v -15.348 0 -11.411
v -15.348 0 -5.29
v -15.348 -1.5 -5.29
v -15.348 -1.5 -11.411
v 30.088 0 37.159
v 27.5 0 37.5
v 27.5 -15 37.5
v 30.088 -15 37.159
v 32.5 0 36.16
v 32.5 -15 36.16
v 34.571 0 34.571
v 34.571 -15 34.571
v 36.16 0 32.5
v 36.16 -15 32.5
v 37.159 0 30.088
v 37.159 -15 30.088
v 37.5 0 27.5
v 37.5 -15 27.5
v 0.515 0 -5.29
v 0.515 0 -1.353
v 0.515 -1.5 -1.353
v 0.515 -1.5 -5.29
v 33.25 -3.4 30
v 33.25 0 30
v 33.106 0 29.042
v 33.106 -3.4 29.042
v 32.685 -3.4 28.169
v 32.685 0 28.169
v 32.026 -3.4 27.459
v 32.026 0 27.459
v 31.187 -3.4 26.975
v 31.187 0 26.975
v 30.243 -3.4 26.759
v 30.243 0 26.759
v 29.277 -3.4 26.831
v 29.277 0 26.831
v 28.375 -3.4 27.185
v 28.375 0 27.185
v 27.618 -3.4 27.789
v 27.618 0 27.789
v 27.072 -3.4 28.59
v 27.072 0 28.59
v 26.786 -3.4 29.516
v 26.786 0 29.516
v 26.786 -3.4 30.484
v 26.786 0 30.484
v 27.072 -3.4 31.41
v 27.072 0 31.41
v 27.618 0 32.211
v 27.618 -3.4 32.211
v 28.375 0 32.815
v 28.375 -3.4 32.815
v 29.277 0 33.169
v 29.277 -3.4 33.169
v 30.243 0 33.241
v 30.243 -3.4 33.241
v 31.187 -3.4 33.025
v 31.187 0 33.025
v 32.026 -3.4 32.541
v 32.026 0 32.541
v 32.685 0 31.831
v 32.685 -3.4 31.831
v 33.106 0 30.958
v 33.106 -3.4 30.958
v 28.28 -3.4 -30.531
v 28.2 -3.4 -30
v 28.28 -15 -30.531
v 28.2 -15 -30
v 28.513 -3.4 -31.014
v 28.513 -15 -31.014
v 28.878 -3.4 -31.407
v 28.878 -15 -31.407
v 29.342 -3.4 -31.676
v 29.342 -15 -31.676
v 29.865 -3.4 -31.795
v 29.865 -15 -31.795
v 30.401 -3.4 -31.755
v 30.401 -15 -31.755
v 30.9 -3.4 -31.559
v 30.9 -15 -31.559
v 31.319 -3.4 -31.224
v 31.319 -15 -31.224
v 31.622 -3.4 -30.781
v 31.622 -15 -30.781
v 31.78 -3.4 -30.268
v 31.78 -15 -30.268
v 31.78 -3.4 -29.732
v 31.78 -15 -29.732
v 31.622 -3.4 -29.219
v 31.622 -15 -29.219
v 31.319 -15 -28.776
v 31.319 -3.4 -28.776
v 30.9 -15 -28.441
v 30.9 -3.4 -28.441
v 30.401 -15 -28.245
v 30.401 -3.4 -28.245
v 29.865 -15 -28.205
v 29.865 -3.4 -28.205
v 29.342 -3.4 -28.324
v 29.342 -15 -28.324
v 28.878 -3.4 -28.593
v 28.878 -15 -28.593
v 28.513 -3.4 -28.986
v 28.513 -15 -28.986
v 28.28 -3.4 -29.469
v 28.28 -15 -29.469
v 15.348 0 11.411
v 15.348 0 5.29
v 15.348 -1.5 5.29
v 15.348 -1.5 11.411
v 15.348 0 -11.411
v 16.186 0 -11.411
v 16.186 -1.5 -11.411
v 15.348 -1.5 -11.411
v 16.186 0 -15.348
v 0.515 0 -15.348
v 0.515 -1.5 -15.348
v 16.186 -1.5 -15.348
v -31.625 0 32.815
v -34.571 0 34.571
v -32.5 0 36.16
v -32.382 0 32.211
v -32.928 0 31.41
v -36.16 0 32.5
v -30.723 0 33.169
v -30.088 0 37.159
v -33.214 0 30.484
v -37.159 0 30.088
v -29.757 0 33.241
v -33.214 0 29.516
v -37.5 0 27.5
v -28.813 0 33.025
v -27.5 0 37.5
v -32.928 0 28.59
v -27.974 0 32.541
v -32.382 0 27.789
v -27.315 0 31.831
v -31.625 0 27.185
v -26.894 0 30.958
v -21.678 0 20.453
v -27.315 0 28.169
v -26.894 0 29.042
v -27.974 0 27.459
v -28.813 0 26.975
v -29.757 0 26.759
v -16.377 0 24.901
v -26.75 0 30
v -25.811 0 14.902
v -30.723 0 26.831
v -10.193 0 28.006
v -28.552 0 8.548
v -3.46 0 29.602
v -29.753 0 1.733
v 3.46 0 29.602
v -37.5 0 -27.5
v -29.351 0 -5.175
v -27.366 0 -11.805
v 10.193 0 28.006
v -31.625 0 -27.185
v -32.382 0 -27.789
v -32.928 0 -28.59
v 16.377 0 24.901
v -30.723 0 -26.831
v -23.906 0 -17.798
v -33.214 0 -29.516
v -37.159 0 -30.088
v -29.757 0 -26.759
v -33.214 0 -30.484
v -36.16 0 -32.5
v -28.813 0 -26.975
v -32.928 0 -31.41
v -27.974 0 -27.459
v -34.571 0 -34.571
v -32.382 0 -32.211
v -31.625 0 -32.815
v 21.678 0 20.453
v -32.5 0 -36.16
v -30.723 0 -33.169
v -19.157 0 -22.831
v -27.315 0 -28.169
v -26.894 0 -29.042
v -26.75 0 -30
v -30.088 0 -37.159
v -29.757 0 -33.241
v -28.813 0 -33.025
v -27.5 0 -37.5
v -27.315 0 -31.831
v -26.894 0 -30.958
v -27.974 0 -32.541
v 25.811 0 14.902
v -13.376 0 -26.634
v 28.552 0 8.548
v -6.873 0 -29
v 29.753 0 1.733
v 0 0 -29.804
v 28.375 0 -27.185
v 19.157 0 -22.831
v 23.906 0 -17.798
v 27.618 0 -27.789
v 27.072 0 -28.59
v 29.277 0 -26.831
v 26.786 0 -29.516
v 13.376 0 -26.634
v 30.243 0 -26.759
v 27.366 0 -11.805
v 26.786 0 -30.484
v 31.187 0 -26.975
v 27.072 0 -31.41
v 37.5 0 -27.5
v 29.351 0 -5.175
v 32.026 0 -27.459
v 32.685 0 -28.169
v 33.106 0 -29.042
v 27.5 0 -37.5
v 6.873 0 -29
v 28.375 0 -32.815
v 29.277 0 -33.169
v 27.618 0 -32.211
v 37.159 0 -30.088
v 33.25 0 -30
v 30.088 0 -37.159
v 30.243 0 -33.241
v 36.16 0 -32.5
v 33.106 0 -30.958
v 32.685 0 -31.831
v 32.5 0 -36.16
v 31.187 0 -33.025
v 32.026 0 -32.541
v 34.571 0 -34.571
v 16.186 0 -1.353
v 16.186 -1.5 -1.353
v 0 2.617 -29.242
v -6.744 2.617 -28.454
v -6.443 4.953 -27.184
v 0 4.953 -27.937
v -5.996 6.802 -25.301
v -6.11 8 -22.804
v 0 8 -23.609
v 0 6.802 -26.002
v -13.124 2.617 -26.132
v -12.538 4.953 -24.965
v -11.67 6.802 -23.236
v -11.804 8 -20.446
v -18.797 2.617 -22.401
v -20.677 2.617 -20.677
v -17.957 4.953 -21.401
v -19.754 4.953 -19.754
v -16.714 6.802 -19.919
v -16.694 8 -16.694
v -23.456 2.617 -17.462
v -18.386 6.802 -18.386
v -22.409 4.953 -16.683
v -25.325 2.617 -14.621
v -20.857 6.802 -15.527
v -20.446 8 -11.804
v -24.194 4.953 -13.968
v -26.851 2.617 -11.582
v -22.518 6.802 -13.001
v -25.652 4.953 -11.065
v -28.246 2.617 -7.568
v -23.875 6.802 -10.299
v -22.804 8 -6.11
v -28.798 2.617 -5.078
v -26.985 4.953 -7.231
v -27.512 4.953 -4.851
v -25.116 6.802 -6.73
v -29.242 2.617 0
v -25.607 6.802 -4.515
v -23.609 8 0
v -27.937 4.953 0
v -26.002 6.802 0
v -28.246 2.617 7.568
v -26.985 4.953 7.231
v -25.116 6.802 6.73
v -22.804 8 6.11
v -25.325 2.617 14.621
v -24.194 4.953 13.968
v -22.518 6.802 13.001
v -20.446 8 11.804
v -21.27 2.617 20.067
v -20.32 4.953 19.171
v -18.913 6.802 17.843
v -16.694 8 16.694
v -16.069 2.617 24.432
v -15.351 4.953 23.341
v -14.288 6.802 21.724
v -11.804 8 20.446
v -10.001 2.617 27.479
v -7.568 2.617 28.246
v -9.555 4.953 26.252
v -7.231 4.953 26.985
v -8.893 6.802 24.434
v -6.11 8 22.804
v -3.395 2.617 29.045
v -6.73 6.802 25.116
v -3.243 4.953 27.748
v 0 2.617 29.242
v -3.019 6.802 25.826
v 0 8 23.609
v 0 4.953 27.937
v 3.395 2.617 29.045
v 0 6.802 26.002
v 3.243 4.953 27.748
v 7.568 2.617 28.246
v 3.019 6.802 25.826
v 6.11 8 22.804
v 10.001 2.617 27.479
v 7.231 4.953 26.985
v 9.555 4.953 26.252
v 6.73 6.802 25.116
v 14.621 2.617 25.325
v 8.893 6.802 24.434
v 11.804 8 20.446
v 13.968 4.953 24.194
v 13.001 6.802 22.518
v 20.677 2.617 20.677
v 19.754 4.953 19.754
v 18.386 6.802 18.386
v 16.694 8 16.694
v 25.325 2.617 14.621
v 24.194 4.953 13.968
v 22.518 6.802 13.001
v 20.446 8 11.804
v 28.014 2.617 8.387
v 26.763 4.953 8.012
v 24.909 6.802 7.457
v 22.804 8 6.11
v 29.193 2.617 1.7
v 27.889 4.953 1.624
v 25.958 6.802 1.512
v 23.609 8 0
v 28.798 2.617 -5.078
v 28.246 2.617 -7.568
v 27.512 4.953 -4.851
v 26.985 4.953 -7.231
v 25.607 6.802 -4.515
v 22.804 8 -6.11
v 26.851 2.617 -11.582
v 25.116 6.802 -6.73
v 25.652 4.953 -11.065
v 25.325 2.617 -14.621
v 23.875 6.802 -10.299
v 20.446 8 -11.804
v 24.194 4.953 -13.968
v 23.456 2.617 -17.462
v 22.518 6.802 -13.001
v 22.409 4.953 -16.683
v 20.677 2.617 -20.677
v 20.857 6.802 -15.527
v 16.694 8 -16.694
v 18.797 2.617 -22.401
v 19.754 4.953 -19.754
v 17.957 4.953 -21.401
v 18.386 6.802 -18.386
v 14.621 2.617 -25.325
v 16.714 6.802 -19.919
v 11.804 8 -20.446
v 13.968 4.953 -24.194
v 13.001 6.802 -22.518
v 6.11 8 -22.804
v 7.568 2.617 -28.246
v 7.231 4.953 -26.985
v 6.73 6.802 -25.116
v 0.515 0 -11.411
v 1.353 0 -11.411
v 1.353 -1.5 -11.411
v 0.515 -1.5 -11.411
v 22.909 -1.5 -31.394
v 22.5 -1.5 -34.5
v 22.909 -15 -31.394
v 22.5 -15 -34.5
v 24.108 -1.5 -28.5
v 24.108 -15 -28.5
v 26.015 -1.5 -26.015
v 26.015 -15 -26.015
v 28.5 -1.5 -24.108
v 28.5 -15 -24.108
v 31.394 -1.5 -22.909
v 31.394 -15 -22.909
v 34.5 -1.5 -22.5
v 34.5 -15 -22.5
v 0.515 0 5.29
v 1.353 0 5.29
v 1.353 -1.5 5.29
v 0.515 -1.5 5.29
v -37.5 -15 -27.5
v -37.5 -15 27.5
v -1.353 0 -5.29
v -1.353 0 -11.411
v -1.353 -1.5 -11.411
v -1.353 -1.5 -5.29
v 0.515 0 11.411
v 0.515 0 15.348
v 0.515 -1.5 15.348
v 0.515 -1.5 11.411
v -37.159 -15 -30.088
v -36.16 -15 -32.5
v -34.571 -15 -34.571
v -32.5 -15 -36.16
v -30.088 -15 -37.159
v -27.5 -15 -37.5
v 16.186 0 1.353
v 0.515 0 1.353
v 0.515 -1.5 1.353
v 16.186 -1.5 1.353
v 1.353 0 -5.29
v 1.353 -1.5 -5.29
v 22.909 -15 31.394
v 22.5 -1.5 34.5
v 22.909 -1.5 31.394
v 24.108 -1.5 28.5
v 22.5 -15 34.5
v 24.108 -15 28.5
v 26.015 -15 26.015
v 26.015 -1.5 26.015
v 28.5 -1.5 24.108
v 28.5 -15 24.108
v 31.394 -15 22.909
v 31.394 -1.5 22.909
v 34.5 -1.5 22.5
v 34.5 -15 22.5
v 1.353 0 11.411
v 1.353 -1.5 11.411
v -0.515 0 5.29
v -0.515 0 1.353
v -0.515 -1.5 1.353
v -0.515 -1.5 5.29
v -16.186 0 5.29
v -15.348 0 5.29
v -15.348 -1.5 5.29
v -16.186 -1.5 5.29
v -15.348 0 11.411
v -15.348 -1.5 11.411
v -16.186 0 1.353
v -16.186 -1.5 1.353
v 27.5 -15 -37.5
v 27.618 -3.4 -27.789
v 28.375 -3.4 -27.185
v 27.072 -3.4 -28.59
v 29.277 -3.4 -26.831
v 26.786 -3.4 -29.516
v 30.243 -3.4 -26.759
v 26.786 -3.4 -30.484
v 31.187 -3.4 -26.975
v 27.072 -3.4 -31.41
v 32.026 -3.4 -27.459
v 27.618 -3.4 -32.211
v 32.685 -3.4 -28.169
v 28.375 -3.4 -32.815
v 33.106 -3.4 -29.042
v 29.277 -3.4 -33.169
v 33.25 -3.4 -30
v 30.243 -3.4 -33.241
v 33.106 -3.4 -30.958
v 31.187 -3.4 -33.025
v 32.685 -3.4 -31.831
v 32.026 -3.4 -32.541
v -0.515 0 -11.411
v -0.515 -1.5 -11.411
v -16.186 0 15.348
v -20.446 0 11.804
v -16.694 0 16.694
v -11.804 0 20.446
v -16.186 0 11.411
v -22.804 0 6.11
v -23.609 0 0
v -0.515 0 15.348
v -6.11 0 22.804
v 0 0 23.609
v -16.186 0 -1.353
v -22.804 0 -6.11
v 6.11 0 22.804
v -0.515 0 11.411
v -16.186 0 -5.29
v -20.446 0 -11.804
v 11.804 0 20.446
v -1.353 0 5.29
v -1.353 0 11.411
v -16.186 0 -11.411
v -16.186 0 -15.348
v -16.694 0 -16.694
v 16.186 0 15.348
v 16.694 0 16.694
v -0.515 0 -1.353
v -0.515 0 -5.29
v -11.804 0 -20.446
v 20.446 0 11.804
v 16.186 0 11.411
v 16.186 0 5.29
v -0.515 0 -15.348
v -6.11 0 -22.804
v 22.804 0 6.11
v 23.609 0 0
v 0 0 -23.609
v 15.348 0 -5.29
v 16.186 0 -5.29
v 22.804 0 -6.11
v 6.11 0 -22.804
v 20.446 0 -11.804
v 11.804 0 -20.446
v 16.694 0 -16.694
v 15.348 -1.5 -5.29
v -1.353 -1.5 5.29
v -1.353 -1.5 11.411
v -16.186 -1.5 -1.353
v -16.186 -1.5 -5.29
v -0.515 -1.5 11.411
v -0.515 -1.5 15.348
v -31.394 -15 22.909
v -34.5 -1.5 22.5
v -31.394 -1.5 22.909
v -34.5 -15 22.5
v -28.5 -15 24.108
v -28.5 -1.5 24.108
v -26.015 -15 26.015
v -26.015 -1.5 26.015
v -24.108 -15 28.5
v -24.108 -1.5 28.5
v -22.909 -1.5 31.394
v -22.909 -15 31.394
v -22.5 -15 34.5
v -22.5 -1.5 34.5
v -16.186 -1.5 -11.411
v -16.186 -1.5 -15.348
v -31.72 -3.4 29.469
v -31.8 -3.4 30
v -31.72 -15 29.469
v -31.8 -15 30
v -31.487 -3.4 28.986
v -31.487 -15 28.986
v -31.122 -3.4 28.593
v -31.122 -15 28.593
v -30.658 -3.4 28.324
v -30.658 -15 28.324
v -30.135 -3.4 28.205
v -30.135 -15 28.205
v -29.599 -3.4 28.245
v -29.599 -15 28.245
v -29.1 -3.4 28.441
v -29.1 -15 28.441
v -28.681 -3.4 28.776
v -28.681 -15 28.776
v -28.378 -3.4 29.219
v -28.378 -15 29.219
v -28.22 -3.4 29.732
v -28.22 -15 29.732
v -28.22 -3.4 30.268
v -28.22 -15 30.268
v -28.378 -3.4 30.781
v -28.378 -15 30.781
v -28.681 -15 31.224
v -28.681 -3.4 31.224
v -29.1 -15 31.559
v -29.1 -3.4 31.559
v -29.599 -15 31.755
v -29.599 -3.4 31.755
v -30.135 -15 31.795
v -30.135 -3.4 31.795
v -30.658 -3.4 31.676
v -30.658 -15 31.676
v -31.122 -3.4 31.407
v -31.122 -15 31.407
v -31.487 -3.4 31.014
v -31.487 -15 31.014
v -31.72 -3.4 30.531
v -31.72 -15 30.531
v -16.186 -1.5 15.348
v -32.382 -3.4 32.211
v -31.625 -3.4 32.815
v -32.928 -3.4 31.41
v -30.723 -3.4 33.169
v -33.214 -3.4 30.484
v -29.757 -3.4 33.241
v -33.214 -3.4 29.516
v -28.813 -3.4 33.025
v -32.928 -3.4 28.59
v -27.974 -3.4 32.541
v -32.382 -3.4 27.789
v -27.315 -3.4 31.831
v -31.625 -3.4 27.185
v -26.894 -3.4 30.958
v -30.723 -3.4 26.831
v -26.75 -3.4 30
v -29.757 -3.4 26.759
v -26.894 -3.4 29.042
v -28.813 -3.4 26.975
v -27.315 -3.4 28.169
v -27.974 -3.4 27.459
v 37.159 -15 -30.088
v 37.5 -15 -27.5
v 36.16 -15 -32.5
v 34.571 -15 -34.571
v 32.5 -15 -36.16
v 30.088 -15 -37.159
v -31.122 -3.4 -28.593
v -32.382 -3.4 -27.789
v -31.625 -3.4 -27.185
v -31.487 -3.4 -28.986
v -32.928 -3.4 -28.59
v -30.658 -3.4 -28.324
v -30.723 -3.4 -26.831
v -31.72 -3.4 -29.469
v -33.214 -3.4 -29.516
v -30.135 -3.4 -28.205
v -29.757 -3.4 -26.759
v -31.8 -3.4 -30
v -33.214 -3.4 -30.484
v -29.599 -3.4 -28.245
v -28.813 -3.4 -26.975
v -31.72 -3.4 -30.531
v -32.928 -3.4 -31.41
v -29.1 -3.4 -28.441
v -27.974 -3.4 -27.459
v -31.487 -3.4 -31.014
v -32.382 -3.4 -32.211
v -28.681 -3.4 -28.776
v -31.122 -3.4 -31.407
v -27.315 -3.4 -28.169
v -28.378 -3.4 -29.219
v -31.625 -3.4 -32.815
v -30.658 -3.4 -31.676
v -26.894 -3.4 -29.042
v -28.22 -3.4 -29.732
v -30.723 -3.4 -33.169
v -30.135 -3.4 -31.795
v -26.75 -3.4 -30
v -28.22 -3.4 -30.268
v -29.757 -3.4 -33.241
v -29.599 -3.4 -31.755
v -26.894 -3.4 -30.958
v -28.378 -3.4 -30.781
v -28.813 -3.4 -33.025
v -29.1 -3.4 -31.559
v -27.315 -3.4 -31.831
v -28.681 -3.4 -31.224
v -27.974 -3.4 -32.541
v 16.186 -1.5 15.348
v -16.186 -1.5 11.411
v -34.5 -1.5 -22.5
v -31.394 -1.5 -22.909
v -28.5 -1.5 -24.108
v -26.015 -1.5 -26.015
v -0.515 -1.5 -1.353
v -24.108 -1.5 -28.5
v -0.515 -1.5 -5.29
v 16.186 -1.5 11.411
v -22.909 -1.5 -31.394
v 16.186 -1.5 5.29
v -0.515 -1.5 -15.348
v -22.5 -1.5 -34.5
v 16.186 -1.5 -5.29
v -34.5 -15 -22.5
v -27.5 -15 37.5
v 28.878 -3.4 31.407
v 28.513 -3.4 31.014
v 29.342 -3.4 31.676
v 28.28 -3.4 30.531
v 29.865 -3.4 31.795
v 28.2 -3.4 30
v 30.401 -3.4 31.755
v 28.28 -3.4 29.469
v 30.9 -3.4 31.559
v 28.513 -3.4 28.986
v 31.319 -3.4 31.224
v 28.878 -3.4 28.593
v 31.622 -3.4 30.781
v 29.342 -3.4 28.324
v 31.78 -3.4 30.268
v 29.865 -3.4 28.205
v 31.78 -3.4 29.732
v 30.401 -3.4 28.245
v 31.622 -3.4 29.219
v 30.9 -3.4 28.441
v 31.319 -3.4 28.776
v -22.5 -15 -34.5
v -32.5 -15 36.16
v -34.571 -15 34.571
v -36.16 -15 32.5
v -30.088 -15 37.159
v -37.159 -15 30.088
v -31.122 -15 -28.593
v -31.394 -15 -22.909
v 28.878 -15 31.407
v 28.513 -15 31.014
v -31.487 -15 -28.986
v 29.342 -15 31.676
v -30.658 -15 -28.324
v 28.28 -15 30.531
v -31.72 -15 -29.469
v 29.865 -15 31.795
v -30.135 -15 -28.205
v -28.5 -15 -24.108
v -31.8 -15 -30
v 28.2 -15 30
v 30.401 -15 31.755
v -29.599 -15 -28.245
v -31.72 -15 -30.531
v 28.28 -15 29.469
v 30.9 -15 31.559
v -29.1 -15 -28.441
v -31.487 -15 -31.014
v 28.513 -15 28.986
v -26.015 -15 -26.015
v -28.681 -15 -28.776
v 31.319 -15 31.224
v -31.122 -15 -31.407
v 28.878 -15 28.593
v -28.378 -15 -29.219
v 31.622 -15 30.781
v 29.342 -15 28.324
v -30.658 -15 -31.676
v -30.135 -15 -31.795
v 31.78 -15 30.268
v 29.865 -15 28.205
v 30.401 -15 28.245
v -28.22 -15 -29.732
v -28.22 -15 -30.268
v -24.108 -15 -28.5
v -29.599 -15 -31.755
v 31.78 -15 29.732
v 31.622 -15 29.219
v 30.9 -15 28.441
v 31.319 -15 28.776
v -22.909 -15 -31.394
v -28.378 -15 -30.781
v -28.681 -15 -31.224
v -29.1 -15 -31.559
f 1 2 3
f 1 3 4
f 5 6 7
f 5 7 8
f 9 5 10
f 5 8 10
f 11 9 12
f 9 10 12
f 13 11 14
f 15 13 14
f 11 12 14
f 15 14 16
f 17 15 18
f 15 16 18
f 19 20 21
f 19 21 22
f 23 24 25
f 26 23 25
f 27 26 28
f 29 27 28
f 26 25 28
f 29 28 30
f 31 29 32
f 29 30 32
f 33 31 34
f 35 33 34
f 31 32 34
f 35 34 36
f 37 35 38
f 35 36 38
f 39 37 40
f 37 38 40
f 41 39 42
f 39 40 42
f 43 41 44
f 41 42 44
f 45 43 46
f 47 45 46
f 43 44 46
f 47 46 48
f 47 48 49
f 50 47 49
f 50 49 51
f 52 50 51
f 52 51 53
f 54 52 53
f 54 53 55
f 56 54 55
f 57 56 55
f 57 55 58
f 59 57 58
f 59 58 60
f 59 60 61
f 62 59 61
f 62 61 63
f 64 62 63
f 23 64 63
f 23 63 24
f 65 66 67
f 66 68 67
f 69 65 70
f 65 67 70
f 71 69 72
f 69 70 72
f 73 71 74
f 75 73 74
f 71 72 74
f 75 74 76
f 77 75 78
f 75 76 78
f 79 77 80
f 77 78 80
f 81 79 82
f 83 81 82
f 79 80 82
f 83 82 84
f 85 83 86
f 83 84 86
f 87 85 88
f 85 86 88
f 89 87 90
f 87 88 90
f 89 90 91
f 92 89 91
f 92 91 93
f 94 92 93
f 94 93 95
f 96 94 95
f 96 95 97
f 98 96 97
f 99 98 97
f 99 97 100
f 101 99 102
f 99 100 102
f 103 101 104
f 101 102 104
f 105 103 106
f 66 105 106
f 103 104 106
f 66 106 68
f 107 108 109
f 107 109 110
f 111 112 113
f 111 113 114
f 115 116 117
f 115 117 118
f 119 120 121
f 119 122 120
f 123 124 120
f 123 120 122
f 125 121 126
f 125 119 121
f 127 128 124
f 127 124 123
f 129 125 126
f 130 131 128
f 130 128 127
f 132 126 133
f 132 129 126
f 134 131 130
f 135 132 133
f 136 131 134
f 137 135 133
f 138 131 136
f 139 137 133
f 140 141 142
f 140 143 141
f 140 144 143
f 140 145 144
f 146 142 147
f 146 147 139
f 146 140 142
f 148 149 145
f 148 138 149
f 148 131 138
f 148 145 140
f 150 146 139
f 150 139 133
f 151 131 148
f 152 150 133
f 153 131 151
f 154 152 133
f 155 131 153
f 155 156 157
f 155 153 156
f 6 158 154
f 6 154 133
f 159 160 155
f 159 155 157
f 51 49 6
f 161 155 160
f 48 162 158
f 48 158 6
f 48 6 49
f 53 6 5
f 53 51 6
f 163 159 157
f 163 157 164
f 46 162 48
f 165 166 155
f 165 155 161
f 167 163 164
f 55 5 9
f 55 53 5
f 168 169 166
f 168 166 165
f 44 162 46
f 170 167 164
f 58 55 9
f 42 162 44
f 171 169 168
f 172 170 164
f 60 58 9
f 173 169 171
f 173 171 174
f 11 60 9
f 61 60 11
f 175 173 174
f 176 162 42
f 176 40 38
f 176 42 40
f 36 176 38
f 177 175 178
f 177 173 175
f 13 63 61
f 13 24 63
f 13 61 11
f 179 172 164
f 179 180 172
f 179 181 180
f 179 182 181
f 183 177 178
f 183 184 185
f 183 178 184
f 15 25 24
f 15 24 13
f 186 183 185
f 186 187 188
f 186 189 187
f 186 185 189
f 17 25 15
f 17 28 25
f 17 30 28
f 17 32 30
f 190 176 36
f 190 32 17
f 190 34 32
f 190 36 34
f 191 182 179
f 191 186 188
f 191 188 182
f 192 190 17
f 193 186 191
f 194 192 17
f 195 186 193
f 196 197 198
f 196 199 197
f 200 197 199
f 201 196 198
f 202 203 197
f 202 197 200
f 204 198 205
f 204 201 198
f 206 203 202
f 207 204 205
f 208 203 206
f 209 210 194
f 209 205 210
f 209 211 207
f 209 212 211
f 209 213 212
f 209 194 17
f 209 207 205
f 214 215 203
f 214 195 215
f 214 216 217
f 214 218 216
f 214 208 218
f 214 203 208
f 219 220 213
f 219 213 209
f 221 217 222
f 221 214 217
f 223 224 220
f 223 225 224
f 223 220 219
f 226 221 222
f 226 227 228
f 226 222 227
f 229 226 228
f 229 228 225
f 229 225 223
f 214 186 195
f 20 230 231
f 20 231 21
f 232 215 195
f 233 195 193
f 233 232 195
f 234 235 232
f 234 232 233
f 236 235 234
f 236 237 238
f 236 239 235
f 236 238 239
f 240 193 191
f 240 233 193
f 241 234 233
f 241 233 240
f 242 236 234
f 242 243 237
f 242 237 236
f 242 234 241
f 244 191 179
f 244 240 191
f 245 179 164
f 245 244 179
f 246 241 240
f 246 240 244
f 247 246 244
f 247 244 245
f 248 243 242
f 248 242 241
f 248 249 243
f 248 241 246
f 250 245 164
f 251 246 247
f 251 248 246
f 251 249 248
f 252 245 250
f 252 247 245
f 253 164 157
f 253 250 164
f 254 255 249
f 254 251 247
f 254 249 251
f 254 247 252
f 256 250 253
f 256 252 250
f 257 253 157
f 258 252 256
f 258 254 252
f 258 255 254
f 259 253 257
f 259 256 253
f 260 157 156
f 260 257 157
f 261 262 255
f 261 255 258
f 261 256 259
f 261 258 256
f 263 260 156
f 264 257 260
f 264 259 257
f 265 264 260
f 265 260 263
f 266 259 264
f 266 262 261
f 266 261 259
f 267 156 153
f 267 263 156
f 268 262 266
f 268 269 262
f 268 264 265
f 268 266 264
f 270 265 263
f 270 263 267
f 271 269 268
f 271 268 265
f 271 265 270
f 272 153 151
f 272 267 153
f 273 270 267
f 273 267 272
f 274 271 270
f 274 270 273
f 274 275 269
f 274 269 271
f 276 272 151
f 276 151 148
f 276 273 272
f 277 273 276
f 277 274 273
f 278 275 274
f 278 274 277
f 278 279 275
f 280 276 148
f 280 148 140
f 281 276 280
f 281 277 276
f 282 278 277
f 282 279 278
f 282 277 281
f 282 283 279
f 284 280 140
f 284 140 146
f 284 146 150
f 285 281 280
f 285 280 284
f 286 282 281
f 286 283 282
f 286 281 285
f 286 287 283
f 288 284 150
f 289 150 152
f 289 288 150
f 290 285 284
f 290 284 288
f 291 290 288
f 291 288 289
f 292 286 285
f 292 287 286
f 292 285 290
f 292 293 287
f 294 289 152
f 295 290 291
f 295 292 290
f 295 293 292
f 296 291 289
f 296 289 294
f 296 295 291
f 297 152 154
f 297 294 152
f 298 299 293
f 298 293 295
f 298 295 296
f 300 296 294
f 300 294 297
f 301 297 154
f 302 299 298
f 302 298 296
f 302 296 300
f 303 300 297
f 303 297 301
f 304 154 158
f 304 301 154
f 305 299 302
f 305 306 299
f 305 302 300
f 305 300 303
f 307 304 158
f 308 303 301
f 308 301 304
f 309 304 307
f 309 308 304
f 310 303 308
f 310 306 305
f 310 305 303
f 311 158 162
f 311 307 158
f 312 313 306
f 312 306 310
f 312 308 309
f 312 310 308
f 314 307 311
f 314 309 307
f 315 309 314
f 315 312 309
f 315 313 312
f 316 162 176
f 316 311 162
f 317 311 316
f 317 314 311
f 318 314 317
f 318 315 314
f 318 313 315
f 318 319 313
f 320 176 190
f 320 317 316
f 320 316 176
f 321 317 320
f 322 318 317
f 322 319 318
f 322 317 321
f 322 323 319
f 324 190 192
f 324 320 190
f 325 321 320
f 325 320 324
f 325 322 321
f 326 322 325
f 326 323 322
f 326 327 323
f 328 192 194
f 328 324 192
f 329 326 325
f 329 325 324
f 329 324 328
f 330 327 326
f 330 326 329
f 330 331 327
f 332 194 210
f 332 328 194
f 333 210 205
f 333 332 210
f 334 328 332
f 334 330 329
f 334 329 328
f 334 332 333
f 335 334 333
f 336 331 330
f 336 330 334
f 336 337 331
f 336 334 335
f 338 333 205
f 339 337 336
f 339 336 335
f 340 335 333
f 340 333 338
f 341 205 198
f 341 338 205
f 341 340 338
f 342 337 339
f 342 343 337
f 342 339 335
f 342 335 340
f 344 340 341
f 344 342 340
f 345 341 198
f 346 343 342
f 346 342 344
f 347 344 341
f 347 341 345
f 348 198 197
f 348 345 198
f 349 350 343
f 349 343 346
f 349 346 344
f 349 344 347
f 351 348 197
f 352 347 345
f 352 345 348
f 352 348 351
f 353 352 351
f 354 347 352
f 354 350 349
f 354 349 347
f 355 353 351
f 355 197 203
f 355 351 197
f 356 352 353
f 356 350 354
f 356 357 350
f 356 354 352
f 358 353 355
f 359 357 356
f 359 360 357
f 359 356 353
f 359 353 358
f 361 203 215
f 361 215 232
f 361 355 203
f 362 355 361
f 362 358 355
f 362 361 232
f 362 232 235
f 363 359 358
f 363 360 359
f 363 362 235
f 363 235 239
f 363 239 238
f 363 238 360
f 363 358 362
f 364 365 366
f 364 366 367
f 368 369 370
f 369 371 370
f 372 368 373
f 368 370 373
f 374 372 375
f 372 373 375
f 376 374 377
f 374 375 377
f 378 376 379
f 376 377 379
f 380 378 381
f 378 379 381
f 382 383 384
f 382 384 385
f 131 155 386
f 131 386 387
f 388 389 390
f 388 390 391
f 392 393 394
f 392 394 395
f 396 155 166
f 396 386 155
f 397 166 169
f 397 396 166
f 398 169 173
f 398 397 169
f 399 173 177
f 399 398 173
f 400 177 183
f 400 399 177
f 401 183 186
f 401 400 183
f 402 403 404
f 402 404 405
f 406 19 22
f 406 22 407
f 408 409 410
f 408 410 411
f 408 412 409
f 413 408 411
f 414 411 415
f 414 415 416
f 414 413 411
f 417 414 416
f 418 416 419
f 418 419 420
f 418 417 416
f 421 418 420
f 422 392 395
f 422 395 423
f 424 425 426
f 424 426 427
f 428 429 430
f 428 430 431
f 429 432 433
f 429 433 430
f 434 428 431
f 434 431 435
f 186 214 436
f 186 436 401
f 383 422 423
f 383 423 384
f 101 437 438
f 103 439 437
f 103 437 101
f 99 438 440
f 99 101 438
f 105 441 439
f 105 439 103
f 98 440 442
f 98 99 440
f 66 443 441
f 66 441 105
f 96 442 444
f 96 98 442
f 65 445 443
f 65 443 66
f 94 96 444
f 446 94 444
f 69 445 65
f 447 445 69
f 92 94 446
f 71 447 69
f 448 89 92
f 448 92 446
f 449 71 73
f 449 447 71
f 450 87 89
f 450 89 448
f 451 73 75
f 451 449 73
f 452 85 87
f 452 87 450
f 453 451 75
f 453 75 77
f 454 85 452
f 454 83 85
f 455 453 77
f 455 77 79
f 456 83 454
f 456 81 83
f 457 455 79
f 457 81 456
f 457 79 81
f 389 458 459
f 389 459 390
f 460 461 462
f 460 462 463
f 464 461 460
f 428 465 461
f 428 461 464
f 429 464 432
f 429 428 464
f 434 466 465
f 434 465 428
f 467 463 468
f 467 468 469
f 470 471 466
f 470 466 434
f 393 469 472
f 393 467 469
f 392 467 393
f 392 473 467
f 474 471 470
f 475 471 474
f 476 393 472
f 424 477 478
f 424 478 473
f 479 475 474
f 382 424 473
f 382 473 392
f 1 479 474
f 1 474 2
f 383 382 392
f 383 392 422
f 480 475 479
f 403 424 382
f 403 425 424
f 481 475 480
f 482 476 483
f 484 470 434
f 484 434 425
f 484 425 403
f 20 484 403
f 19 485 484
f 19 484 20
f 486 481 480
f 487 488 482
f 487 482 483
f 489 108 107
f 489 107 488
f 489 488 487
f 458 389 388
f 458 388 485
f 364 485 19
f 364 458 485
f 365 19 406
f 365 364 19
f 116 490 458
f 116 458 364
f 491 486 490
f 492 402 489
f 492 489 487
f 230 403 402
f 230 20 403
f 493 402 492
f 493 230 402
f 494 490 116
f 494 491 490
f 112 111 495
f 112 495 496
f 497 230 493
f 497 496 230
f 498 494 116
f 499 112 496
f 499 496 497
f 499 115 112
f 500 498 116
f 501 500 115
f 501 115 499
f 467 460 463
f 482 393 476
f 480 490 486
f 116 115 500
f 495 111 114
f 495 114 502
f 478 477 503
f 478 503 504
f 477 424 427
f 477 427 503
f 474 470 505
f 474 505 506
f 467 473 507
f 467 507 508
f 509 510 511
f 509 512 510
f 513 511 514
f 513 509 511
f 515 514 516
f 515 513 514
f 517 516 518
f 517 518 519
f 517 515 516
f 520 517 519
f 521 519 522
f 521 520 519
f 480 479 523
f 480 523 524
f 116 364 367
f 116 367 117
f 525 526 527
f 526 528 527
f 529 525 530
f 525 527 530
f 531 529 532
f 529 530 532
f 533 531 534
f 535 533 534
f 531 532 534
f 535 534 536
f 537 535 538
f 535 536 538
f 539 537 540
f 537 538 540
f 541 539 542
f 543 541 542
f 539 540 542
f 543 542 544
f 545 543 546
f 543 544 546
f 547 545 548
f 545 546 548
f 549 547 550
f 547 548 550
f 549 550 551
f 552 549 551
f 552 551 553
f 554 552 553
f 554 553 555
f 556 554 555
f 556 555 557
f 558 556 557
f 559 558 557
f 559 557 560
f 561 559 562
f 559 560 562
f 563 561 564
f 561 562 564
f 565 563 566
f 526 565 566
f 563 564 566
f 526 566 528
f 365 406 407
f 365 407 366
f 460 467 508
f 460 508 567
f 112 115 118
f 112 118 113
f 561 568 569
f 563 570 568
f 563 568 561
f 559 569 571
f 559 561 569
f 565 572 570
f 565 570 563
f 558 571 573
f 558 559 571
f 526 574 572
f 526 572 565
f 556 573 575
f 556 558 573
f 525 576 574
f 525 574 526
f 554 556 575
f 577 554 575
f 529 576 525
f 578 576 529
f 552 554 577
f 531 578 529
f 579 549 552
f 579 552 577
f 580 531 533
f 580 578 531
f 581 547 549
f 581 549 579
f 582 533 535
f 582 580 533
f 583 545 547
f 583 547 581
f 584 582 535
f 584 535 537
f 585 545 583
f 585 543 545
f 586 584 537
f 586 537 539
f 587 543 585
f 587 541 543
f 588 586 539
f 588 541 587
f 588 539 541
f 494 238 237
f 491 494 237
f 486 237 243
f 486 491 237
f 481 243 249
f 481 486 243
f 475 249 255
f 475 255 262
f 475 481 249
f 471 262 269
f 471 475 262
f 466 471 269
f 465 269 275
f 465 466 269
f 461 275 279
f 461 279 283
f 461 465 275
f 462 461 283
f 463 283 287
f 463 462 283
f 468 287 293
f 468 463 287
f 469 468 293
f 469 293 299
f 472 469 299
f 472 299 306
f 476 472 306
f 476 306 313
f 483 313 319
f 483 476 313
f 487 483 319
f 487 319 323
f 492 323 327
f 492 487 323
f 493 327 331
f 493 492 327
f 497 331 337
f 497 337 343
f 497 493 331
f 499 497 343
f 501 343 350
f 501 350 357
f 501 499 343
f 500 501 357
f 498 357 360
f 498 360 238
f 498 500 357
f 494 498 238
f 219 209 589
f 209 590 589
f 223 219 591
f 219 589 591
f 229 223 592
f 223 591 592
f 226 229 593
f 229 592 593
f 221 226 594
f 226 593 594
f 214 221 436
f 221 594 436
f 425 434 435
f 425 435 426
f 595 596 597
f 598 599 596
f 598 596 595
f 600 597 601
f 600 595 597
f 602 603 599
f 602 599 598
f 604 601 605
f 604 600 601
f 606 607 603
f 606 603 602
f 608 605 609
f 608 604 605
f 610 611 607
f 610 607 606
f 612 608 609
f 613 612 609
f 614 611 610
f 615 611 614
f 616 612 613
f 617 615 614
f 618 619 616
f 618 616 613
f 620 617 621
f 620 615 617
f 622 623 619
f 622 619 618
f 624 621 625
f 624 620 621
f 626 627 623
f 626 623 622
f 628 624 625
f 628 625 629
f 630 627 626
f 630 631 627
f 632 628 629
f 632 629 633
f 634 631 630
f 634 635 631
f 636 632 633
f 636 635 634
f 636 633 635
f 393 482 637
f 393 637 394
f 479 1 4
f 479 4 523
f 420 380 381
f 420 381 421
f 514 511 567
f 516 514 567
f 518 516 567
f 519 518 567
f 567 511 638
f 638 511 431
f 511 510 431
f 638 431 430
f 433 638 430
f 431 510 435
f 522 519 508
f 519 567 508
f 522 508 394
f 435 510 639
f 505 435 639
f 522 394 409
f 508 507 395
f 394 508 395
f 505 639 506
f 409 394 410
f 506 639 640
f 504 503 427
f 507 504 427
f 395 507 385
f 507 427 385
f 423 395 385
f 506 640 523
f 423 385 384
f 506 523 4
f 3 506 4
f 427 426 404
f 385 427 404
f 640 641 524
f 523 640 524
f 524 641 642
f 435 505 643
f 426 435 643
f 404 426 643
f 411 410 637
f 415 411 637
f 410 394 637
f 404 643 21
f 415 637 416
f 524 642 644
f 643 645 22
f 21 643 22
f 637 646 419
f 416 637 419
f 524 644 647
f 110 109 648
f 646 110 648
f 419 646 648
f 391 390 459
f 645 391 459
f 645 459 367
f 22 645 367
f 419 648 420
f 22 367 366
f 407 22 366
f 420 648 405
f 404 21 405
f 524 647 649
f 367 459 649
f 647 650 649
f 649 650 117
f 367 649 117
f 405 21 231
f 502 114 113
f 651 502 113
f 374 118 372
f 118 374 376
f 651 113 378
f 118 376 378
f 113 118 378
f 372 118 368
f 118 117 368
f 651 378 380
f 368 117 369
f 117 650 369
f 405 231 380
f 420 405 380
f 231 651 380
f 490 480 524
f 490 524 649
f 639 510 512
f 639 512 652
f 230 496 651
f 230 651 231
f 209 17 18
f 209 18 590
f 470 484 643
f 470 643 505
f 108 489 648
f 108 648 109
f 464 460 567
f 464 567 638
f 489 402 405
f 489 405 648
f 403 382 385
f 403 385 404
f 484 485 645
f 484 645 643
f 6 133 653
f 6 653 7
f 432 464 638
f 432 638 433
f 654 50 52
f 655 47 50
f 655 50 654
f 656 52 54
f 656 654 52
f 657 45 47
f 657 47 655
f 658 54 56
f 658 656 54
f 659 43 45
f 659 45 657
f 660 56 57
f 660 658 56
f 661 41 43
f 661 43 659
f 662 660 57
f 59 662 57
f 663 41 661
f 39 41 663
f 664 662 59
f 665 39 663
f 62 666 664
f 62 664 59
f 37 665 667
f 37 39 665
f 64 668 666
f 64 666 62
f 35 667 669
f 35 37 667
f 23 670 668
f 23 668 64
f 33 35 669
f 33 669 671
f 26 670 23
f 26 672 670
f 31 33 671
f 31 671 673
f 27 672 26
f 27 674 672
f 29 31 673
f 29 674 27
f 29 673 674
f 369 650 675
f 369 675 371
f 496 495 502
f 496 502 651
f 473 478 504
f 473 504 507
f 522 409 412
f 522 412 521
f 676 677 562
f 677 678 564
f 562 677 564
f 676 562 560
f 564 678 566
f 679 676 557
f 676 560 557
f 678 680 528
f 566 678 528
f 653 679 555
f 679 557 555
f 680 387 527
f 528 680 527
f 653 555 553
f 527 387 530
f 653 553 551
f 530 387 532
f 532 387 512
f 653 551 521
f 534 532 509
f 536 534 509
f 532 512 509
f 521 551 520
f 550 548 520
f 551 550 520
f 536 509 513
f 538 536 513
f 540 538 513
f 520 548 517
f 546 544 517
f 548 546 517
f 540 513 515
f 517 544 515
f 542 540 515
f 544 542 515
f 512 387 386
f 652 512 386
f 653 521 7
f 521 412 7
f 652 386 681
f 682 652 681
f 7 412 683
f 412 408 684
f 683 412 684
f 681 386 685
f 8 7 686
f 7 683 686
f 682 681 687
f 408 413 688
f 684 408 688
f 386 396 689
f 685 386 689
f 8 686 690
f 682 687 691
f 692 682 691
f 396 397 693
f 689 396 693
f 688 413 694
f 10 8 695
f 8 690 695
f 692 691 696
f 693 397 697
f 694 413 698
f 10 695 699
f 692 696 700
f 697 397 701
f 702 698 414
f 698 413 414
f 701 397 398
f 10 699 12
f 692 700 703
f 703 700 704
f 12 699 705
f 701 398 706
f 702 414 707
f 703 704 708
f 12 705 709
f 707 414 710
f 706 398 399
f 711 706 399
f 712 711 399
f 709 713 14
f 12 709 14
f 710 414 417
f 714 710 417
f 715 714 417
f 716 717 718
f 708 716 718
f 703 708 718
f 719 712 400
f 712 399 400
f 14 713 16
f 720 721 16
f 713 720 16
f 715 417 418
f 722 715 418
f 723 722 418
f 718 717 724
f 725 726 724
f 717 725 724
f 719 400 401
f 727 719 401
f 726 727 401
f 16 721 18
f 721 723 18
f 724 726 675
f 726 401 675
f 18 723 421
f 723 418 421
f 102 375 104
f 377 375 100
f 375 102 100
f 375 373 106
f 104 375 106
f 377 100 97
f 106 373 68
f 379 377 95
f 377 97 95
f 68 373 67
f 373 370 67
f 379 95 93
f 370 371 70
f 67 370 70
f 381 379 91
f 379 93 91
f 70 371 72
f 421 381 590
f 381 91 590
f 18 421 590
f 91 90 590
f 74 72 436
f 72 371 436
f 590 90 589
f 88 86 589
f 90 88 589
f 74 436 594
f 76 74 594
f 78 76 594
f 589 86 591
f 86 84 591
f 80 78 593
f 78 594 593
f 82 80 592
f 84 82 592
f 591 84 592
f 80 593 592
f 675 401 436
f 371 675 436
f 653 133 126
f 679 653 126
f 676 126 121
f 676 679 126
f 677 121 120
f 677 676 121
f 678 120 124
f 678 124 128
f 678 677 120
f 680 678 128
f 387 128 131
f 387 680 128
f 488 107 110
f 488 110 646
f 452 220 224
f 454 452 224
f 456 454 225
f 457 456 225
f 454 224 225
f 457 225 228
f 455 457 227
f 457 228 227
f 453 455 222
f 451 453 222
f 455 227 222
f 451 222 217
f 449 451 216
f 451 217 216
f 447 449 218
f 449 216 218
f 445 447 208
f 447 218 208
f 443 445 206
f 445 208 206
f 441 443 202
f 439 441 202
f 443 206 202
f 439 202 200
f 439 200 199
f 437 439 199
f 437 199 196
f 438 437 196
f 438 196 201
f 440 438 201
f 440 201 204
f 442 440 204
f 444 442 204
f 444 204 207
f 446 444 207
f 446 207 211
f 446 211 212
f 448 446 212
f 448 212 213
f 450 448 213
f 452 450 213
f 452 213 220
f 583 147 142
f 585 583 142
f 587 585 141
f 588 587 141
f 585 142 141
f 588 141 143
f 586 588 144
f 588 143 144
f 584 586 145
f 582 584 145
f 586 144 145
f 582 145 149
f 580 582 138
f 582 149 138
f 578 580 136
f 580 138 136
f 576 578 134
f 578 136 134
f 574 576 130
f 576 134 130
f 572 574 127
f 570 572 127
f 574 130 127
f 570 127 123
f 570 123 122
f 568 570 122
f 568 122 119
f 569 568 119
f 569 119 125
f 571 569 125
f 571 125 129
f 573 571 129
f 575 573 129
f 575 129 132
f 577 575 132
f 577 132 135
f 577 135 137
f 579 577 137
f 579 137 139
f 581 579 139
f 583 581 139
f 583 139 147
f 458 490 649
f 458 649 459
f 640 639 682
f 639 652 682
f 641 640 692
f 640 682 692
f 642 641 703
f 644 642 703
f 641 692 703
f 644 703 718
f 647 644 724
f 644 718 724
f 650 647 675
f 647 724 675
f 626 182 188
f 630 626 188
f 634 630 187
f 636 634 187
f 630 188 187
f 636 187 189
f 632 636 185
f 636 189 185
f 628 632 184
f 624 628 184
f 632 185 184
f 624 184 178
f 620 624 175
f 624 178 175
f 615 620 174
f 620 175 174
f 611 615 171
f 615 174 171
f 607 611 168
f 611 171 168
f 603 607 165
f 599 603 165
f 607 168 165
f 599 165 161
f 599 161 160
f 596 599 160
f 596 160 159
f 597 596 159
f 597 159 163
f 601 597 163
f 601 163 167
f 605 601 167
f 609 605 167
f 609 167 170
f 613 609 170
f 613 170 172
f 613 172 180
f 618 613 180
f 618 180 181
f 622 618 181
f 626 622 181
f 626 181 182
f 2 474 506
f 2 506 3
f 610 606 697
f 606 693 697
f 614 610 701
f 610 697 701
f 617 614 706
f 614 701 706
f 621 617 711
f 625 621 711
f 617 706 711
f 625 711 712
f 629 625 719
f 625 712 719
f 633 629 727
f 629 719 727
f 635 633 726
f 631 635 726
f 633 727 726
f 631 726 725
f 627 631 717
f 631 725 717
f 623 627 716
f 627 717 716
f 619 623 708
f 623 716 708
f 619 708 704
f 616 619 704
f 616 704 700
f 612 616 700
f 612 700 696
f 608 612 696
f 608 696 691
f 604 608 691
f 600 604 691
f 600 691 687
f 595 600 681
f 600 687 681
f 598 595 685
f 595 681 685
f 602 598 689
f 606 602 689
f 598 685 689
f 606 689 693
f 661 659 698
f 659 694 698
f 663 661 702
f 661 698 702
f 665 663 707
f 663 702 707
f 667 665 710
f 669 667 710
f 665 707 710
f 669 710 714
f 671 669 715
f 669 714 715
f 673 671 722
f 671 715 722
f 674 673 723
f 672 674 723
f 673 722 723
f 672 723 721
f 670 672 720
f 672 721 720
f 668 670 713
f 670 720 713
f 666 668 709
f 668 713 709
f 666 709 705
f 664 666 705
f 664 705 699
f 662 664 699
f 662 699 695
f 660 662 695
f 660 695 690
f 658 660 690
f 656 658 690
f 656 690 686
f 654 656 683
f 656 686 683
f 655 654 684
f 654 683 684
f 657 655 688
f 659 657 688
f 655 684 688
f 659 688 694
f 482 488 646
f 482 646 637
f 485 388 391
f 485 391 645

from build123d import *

# Parameters (mm, degrees)
SKIZZE1_R                                            = 1.6
AUFSATZ_LINEAR_AUSTRAGEN1_DEPTH                      = 15
AUFSATZ_LINEAR_AUSTRAGEN2_DEPTH                      = 1.5
VERRUNDUNG1_R                                        = 10
VERRUNDUNG2_R                                        = 12
STIRNSENKUNG_F_R_M3_ZYLINDERSCHRAUBE_MIT_D           = 3.6
STIRNSENKUNG_F_R_M3_ZYLINDERSCHRAUBE_MIT_CBORE_D     = 6.5
STIRNSENKUNG_F_R_M3_ZYLINDERSCHRAUBE_MIT_CBORE_DEPTH = 3.4


with BuildPart() as part:
    # Skizze1 → Aufsatz-Linear austragen1 (new body)
    with BuildSketch(Plane(origin=(0, 0, 0), x_dir=(1, 0, 0), z_dir=(0, 1, 0))):
        Polygon((-37.5, 22.5), (-37.5, -37.5), (37.5, -37.5), (37.5, 37.5), (-35, 37.5), (-37.5, 37.5), align=None)
        with Locations(Location((-30, -30, 0), (0, 0, 270))):
            Circle(SKIZZE1_R, mode=Mode.SUBTRACT)
        with Locations(Location((30, -30, 0), (0, 0, 270))):
            Circle(SKIZZE1_R, mode=Mode.SUBTRACT)
        with Locations(Location((-30, 30, 0), (0, 0, 270))):
            Circle(SKIZZE1_R, mode=Mode.SUBTRACT)
        Polygon((-22.5, 22.5), (-22.5, 34.5), (22.5, 34.5), (22.5, 22.5), (34.5, 22.5), (34.5, -22.5), (22.5, -22.5), (22.5, -34.5), (-22.5, -34.5), (-22.5, -22.5), (-34.5, -22.5), (-34.5, 22.5), align=None, mode=Mode.SUBTRACT)
        with Locations(Location((30, 30, 0), (0, 0, 270))):
            Circle(SKIZZE1_R, mode=Mode.SUBTRACT)
    extrude(amount=-AUFSATZ_LINEAR_AUSTRAGEN1_DEPTH)

    # Skizze1<3> → Aufsatz-Linear austragen2 (add)
    with BuildSketch(Plane(origin=(0, 0, 0), x_dir=(1, 0, 0), z_dir=(0, 1, 0))):
        Polygon((22.5, 34.5), (-22.5, 34.5), (-22.5, 22.5), (-34.5, 22.5), (-34.5, -22.5), (-22.5, -22.5), (-22.5, -34.5), (22.5, -34.5), (22.5, -22.5), (34.5, -22.5), (34.5, 22.5), (22.5, 22.5), align=None)
        Polygon((-0.51468496, -5.28988496), (-1.35288496, -5.28988496), (-1.35288496, -11.41128496), (-0.51468496, -11.41128496), (-0.51468496, -15.34828496), (-1.35288496, -15.34828496), (-15.34828496, -15.34828496), (-16.18648496, -15.34828496), (-16.18648496, -11.41128496), (-15.34828496, -11.41128496), (-15.34828496, -5.28988496), (-16.18648496, -5.28988496), (-16.18648496, -1.35288496), (-15.34828496, -1.35288496), (-1.35288496, -1.35288496), (-0.51468496, -1.35288496), align=None, mode=Mode.SUBTRACT)
        Polygon((15.34828496, -15.34828496), (1.35288496, -15.34828496), (0.51468496, -15.34828496), (0.51468496, -11.41128496), (1.35288496, -11.41128496), (1.35288496, -5.28988496), (0.51468496, -5.28988496), (0.51468496, -1.35288496), (1.35288496, -1.35288496), (15.34828496, -1.35288496), (16.18648496, -1.35288496), (16.18648496, -5.28988496), (15.34828496, -5.28988496), (15.34828496, -11.41128496), (16.18648496, -11.41128496), (16.18648496, -15.34828496), align=None, mode=Mode.SUBTRACT)
        Polygon((-15.34828496, 15.34828496), (-1.35288496, 15.34828496), (-0.51468496, 15.34828496), (-0.51468496, 11.41128496), (-1.35288496, 11.41128496), (-1.35288496, 5.28988496), (-0.51468496, 5.28988496), (-0.51468496, 1.35288496), (-1.35288496, 1.35288496), (-15.34828496, 1.35288496), (-16.18648496, 1.35288496), (-16.18648496, 5.28988496), (-15.34828496, 5.28988496), (-15.34828496, 11.41128496), (-16.18648496, 11.41128496), (-16.18648496, 15.34828496), align=None, mode=Mode.SUBTRACT)
        Polygon((0.51468496, 5.28988496), (1.35288496, 5.28988496), (1.35288496, 11.41128496), (0.51468496, 11.41128496), (0.51468496, 15.34828496), (1.35288496, 15.34828496), (15.34828496, 15.34828496), (16.18648496, 15.34828496), (16.18648496, 11.41128496), (15.34828496, 11.41128496), (15.34828496, 5.28988496), (16.18648496, 5.28988496), (16.18648496, 1.35288496), (15.34828496, 1.35288496), (1.35288496, 1.35288496), (0.51468496, 1.35288496), align=None, mode=Mode.SUBTRACT)
    extrude(amount=-AUFSATZ_LINEAR_AUSTRAGEN2_DEPTH)

    # Verrundung1
    verrundung1_edges = [part.edges().sort_by_distance(p)[0] for p in [
        (37.5, -7.5, -37.5),
        (37.5, -7.5, 37.5),
        (-37.5, -7.5, 37.5),
        (-37.5, -7.5, -37.5),
    ]]
    fillet(verrundung1_edges, radius=VERRUNDUNG1_R)

    # Verrundung2
    verrundung2_edges = [part.edges().sort_by_distance(p)[0] for p in [
        (22.5, -8.25, 22.5),
        (-22.5, -8.25, 22.5),
        (22.5, -8.25, -22.5),
        (-22.5, -8.25, -22.5),
    ]]
    fillet(verrundung2_edges, radius=VERRUNDUNG2_R - 0.0001)  # a hair under: the kernel refuses the full size

    # Skizze3 → Rotation1 (revolve)
    with BuildSketch(Plane(origin=(0, 0, 0), x_dir=(0, 0, -1), z_dir=(1, 0, 0))):
        with BuildLine():
            Line((23.608930659, 0), (29.803663871, 0))
            ThreePointArc((29.803663871, 0), (27.936560085, 4.952643744), (23.608930659, 8))
            Line((23.608930659, 8), (23.608930659, 0))
        make_face()
    revolve(axis=Axis((0, 0, 0), (0, 1, 0)))

    # Stirnsenkung für M3 Zylinderschraube mit Innensechskant1 (through all)
    with Locations(Plane(origin=(0, 0, 0), x_dir=(1, 0, 0), z_dir=(0, 1, 0))):
        with Locations((-30, 30), (30, 30), (-30, -30), (30, -30)):
            CounterBoreHole(STIRNSENKUNG_F_R_M3_ZYLINDERSCHRAUBE_MIT_D / 2, STIRNSENKUNG_F_R_M3_ZYLINDERSCHRAUBE_MIT_CBORE_D / 2, STIRNSENKUNG_F_R_M3_ZYLINDERSCHRAUBE_MIT_CBORE_DEPTH)


solid = part.part
